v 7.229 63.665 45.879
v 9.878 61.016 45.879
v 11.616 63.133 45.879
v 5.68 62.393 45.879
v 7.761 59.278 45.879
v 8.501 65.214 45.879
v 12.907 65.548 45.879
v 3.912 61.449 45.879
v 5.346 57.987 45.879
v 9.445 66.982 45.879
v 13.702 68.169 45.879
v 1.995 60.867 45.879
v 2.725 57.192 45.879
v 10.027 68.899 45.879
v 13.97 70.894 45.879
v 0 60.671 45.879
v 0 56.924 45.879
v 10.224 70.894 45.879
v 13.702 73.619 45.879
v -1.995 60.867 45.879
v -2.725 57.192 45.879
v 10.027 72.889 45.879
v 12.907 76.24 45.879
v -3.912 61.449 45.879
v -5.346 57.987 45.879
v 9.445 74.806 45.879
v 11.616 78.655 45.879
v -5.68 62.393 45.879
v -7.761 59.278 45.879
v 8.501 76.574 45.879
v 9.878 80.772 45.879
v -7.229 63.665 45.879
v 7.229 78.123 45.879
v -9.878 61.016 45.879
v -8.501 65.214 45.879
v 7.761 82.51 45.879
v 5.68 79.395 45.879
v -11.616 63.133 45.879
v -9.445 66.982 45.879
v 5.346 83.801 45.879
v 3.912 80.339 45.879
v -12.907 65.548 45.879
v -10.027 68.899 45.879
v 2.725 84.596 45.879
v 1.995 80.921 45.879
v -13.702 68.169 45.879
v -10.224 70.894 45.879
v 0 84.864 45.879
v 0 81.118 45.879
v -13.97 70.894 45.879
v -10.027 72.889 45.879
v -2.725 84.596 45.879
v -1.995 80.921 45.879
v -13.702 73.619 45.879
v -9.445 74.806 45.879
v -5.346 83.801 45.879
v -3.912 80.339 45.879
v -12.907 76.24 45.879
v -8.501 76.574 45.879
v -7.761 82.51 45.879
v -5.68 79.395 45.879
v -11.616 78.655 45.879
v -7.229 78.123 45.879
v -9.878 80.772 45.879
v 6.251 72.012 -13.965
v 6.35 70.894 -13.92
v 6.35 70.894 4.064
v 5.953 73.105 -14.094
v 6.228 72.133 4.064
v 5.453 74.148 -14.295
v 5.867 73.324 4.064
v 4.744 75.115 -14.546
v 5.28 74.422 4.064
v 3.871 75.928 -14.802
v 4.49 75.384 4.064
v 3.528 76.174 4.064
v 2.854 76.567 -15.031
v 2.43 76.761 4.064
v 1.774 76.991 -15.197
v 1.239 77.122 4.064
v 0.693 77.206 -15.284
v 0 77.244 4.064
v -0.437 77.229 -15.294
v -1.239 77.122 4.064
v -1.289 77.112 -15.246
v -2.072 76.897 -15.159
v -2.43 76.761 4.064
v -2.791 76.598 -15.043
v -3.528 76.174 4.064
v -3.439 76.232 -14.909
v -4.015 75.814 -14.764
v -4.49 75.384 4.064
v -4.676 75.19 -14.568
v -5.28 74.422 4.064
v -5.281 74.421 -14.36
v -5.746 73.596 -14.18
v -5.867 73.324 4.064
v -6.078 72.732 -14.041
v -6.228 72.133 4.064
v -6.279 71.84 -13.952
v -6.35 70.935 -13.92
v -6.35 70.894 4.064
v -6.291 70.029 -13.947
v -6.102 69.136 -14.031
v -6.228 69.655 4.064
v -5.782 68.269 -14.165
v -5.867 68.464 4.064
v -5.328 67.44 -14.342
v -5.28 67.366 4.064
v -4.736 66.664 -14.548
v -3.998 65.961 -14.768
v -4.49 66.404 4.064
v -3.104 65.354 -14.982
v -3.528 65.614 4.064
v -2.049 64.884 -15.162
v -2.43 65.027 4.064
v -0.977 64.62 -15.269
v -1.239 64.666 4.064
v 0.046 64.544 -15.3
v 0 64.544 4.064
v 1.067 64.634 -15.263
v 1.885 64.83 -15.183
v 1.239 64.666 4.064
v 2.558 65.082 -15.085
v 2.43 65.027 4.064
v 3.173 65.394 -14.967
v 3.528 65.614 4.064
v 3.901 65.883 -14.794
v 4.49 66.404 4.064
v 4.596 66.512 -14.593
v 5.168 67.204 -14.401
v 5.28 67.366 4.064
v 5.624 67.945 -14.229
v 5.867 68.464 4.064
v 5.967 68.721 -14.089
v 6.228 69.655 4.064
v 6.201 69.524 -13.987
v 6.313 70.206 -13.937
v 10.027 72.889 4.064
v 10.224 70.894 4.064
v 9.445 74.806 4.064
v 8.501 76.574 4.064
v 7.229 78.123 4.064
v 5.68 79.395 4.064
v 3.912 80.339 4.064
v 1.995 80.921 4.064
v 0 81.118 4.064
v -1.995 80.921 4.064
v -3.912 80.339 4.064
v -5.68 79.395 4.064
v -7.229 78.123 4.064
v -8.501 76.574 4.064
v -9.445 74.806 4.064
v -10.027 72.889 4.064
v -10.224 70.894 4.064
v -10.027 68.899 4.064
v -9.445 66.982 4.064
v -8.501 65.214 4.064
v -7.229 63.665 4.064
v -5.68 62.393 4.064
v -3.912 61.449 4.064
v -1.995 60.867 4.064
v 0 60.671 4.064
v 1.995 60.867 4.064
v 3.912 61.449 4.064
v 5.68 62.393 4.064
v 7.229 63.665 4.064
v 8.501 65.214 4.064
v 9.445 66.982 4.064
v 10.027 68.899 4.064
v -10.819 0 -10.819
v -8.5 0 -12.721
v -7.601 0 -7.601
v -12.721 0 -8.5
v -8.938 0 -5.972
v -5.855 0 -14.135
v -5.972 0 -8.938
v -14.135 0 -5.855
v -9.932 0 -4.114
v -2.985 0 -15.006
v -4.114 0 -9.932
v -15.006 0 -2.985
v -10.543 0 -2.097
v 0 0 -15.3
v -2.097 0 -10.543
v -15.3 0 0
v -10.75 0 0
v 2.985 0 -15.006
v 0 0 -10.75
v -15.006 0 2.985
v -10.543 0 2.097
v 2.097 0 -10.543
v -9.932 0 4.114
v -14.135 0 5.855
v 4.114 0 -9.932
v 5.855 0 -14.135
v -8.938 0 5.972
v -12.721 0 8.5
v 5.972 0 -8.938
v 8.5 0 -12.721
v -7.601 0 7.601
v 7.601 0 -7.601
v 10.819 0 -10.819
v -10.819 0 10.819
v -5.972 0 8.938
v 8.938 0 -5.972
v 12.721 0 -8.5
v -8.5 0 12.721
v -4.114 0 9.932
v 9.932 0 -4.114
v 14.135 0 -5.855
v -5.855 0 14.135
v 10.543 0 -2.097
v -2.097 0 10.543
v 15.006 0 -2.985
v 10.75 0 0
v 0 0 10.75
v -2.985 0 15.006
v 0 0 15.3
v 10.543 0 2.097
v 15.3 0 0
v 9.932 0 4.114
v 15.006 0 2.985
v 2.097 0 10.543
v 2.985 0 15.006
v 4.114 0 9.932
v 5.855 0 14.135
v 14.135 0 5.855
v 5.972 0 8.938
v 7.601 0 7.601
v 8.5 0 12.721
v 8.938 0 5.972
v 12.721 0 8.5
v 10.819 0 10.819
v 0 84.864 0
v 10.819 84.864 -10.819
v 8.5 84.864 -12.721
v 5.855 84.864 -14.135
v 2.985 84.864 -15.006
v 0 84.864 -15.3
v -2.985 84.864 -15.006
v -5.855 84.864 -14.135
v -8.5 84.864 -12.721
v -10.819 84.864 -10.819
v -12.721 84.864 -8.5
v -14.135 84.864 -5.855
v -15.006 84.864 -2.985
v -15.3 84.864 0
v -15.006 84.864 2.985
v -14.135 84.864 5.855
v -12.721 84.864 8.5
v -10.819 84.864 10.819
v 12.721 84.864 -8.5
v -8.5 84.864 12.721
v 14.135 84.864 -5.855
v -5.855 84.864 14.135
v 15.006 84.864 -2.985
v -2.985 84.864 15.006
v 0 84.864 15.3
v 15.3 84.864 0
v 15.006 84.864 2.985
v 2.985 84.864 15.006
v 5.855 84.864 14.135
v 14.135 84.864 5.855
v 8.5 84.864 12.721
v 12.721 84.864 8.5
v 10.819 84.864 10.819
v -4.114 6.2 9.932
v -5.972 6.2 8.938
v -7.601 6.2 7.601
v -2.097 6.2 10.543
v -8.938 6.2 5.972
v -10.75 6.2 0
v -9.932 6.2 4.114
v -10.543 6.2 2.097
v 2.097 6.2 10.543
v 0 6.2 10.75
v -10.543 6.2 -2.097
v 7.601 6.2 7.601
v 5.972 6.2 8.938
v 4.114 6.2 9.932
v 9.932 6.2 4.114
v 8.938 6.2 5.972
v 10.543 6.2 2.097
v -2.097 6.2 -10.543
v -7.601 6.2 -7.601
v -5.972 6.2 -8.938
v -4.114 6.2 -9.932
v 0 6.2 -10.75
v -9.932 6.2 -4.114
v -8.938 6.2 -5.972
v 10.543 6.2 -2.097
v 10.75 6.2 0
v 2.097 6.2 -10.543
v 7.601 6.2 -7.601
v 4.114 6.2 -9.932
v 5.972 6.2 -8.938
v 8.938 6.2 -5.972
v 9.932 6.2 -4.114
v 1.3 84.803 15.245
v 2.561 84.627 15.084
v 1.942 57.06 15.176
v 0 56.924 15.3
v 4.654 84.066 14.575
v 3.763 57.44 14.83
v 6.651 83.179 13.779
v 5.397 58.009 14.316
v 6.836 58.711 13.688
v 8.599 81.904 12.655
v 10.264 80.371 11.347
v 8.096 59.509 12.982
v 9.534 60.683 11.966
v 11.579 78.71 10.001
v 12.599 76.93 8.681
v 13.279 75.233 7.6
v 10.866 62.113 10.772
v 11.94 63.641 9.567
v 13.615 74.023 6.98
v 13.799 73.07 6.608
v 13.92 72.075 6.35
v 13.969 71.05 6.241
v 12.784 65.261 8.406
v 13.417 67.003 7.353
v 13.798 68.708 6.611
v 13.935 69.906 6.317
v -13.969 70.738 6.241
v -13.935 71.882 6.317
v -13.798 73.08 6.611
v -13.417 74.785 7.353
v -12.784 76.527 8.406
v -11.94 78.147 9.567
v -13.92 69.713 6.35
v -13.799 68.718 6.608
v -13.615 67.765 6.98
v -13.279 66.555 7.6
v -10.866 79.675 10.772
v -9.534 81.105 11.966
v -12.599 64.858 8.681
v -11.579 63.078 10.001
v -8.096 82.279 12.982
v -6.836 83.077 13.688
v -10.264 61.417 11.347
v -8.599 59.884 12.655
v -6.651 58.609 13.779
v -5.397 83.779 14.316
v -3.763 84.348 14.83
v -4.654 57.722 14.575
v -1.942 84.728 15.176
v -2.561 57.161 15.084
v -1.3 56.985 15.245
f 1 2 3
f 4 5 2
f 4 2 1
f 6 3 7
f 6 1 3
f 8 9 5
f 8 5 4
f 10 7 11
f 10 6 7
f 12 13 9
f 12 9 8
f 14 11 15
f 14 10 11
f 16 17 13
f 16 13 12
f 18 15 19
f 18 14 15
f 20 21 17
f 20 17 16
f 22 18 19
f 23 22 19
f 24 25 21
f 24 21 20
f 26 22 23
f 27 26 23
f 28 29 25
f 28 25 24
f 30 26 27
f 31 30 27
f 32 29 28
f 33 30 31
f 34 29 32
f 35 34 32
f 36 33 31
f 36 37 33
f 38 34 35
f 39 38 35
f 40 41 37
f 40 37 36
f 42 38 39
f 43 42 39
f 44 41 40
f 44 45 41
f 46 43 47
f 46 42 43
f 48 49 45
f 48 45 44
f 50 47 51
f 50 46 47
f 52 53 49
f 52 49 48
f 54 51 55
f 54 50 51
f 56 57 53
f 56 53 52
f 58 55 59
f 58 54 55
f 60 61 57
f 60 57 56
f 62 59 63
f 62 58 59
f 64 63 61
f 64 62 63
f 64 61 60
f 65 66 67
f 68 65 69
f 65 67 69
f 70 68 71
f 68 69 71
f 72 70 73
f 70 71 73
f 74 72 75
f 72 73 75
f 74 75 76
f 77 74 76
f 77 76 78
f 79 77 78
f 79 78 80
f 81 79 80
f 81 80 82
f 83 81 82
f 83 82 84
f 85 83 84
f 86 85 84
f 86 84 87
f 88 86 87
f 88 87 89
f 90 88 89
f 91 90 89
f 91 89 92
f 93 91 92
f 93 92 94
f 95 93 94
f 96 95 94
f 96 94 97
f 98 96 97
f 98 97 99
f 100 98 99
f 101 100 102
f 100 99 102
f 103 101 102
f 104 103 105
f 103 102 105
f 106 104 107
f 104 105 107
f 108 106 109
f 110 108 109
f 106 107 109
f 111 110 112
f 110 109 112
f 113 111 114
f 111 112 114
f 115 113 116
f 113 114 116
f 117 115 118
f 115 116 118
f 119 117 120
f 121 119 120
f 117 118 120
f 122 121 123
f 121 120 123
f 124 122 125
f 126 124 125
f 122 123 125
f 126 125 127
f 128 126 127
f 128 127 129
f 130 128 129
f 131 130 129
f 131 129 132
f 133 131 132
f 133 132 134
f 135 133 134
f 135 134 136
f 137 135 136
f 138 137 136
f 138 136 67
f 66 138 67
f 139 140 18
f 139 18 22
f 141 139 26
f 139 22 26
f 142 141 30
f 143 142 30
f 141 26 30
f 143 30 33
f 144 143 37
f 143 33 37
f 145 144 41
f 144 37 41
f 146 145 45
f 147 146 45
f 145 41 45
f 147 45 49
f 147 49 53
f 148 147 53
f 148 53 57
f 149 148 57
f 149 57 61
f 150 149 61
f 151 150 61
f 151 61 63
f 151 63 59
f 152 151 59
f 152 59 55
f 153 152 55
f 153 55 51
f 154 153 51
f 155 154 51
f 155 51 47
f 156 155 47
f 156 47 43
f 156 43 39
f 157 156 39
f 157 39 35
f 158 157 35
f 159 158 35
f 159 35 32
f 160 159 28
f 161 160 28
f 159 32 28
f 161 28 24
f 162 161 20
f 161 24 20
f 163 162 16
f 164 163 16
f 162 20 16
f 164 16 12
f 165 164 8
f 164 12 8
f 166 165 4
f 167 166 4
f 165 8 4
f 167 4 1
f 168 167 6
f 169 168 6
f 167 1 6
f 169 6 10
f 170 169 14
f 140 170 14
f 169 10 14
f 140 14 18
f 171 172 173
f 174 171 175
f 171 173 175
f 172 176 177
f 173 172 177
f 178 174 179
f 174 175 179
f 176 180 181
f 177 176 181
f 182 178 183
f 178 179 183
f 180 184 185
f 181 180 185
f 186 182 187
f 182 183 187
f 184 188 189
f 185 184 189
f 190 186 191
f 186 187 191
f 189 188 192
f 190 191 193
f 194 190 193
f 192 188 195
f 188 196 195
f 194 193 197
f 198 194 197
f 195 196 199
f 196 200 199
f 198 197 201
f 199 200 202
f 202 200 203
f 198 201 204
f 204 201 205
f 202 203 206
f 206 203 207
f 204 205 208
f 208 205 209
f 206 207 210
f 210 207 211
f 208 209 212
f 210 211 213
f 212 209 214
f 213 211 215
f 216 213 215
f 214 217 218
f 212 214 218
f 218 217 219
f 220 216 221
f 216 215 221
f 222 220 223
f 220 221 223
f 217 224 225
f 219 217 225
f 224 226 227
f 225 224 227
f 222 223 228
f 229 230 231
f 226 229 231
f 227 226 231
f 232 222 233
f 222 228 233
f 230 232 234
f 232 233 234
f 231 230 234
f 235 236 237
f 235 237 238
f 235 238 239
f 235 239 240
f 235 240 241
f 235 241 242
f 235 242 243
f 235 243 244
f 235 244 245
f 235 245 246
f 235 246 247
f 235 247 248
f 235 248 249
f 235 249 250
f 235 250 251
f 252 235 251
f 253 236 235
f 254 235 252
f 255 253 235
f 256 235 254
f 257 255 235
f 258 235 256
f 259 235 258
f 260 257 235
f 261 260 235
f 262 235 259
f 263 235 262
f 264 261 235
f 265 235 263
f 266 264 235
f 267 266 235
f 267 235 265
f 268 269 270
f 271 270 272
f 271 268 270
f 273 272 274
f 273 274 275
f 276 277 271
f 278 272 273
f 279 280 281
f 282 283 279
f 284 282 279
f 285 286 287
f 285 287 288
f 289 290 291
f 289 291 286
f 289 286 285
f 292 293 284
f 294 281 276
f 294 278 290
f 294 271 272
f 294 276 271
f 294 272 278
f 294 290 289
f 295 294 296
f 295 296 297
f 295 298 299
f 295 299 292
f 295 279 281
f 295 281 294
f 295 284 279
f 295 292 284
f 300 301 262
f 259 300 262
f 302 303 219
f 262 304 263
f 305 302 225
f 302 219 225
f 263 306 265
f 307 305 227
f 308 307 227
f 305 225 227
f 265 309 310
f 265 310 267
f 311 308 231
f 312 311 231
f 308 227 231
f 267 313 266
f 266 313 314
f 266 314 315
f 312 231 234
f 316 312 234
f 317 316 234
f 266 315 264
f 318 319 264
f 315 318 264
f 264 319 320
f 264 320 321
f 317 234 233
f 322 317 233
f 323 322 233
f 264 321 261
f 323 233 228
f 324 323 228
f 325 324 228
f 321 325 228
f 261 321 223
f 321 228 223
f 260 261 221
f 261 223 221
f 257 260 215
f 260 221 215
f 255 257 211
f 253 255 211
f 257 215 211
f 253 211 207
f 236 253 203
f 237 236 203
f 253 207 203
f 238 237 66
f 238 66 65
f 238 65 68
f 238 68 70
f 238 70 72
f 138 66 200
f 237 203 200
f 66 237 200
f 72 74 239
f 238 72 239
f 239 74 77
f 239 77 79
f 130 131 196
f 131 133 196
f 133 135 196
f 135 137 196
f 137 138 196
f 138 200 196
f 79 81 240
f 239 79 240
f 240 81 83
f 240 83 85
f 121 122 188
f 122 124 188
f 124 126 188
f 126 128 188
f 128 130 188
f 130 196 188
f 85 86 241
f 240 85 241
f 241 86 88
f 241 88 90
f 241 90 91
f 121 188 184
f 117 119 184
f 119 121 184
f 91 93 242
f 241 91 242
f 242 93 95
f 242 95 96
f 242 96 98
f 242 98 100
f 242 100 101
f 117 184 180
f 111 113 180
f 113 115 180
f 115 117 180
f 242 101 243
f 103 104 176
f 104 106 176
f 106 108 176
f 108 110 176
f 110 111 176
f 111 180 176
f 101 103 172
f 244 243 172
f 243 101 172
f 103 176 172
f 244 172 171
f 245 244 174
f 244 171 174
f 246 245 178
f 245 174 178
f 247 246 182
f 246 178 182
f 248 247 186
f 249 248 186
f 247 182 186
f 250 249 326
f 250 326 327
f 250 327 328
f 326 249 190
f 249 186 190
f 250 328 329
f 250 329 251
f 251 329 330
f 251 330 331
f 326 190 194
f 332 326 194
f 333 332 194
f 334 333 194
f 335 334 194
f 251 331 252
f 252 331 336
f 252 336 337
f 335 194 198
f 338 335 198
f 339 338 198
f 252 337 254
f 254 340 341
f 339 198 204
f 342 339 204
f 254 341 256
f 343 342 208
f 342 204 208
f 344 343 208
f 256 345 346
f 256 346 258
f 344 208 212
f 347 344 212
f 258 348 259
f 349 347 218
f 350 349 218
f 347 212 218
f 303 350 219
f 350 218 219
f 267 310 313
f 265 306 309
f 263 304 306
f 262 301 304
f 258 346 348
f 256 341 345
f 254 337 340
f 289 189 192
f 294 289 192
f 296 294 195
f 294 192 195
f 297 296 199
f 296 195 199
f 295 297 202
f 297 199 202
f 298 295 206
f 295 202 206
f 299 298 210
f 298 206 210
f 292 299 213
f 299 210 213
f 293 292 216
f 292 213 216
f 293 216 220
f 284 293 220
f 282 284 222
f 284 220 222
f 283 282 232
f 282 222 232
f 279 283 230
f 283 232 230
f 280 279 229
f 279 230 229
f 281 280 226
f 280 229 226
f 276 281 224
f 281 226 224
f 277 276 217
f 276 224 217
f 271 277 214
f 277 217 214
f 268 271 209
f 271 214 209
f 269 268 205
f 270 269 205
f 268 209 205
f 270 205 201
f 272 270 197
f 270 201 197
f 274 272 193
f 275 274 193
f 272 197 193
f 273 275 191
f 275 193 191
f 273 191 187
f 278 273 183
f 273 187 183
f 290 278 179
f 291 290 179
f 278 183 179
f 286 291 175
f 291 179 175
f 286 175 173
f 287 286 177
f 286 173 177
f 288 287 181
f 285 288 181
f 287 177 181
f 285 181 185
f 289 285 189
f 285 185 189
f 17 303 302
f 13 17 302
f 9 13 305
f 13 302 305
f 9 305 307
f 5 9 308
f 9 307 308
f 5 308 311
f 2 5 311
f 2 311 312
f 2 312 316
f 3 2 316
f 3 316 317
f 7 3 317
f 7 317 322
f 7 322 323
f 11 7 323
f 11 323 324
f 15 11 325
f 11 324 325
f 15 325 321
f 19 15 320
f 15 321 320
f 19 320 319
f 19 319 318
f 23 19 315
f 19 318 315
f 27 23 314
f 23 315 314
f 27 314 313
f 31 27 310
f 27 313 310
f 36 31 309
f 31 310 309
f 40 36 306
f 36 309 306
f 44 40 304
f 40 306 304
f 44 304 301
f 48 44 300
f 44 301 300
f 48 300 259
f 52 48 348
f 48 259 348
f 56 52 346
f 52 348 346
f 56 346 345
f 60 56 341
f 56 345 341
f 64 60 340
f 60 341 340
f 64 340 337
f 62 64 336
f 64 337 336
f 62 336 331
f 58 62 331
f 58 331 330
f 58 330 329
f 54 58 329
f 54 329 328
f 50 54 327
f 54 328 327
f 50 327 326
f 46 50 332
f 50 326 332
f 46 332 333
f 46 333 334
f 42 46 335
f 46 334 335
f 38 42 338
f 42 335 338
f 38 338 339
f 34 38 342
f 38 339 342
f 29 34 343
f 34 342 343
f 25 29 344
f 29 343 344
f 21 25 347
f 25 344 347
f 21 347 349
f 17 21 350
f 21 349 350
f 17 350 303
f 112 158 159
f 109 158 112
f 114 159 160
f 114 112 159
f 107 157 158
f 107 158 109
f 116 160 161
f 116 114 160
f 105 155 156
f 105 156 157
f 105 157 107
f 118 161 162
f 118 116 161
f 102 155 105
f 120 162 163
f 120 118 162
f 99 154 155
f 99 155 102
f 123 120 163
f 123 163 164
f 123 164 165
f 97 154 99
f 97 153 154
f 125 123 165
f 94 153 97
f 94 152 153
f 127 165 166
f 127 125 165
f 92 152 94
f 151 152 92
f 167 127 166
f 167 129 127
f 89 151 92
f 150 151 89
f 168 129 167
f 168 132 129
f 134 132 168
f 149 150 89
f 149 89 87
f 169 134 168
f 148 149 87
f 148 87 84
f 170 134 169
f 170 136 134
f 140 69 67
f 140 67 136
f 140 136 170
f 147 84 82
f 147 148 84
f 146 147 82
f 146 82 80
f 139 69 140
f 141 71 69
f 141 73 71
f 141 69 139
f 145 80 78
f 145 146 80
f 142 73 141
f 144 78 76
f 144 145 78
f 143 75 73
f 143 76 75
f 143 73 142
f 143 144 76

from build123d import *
from build123d.topology import SkipClean

# Parameters (mm, degrees)
SKETCH1_R           = 15.3
BOSS_EXTRUDE1_DEPTH = 84.864
SKETCH2_R           = 13.97
BOSS_EXTRUDE2_DEPTH = 57.15
BOSS_EXTRUDE3_DEPTH = 2.54
SKETCH4_R           = 10.2235
CUT_EXTRUDE1_DEPTH  = 5.08
SKETCH5_R           = 14.2621
SKETCH5_R_2         = 10.2235
BOSS_EXTRUDE4_DEPTH = 19.05
SKETCH6_R           = 10.75
CUT_EXTRUDE2_DEPTH  = 6.2
SKETCH8_R           = 14.2621
CUT_EXTRUDE5_DEPTH  = 10.16
SKETCH10_R          = 13.97
BOSS_EXTRUDE5_DEPTH = 24.13
SKETCH11_R          = 10.2235
CUT_EXTRUDE7_DEPTH  = 41.91
SKETCH13_R          = 14.2621
SKETCH13_R_2        = 10.2235
CUT_EXTRUDE9_DEPTH  = 41.91
SKETCH16_R          = 13.97
SKETCH16_R_2        = 10.2235
CUT_EXTRUDE10_DEPTH = 27.78125
SKETCH17_R          = 10.2235
CUT_EXTRUDE11_DEPTH = 27.686
SKETCH18_R          = 6.35
CUT_EXTRUDE12_DEPTH = 111.506


with BuildPart() as part:
    # Sketch1 → Boss-Extrude1 (new body)
    with BuildSketch(Plane(origin=(0, 0, 0), x_dir=(1, 0, 0), z_dir=(0, 1, 0))):
        with Locations(Location((0, 0, 0), (0, 0, 270))):
            Circle(SKETCH1_R)
    extrude(amount=BOSS_EXTRUDE1_DEPTH)

    # Sketch2 → Boss-Extrude2 (add)
    with BuildSketch(Plane.XY):
        with Locations(Location((0, 70.894, 0), (0, 0, 269.999999993))):
            Circle(SKETCH2_R)
    extrude(amount=BOSS_EXTRUDE2_DEPTH)

    # Sketch3 → Boss-Extrude3 (add, symmetric)
    with BuildSketch(Plane.XY.offset(57.15)):
        with BuildLine():
            Line((16.764, 70.894), (16.764, 40.838899717))
            ThreePointArc((16.764, 40.838899717), (0, 24.074899717), (-16.764, 40.838899717))
            Line((-16.764, 40.838899717), (-16.764, 70.894))
            ThreePointArc((-16.764, 70.894), (0, 87.658), (16.764, 70.894))
        make_face()
    extrude(amount=BOSS_EXTRUDE3_DEPTH, both=True)

    # Sketch4 → Cut-Extrude1 (cut)
    with BuildSketch(Plane.XY.offset(59.69)):
        with Locations((0, 40.838899717)):
            Circle(SKETCH4_R)
    extrude(amount=-CUT_EXTRUDE1_DEPTH, mode=Mode.SUBTRACT)

    # Sketch5 → Boss-Extrude4 (add, symmetric)
    with SkipClean():  # the faces are left unmerged after this step: merging them gives an invalid solid
        with BuildSketch(Plane(origin=(0, 0, 54.61), x_dir=(-1, 0, 0), z_dir=(0, 0, -1))):
            with Locations(Location((0, 40.838899717, 0), (0, 0, 180))):
                Circle(SKETCH5_R)
            with Locations((0, 40.838899717)):
                Circle(SKETCH5_R_2, mode=Mode.SUBTRACT)
        extrude(amount=BOSS_EXTRUDE4_DEPTH, both=True)

    # Sketch6 → Cut-Extrude2 (cut)
    with SkipClean():  # the faces are left unmerged after this step: merging them gives an invalid solid
        with BuildSketch(Plane.XZ):
            with Locations(Location((0, 0, 0), (0, 0, 270))):
                Circle(SKETCH6_R)
        extrude(amount=-CUT_EXTRUDE2_DEPTH, mode=Mode.SUBTRACT)

    # Sketch8 → Cut-Extrude5 (cut)
    with SkipClean():  # the faces are left unmerged after this step: merging them gives an invalid solid
        with BuildSketch(Plane.XY.offset(59.69)):
            with BuildLine():
                Line((-16.764, 70.894), (-16.764, 40.838899717))
                ThreePointArc((-16.764, 40.838899717), (0, 24.074899717), (16.764, 40.838899717))
                Line((16.764, 40.838899717), (16.764, 70.894))
                ThreePointArc((16.764, 70.894), (0, 87.658), (-16.764, 70.894))
            make_face()
            with Locations((0, 40.838899717)):
                Circle(SKETCH8_R, mode=Mode.SUBTRACT)
        extrude(amount=-CUT_EXTRUDE5_DEPTH, mode=Mode.SUBTRACT)


with BuildPart() as cut_extrude5_piece_1:
    # of the separate pieces the step leaves, piece 1, a body of its own (cut_extrude5_pieces)
    add(part.part.solids().sort_by_distance((0, 0, 15.3))[0])

    # Sketch10 → Boss-Extrude5 (add)
    with BuildSketch(Plane.XY.offset(49.53)):
        with Locations(Location((0, 70.894, 0), (0, 0, 90))):
            Circle(SKETCH10_R)
    extrude(amount=BOSS_EXTRUDE5_DEPTH)

    # Sketch11 → Cut-Extrude7 (cut)
    with BuildSketch(Plane.XY.offset(73.66)):
        with Locations((0, 70.894)):
            Circle(SKETCH11_R)
    extrude(amount=-CUT_EXTRUDE7_DEPTH, mode=Mode.SUBTRACT)

    # Sketch16 → Cut-Extrude10 (cut)
    with BuildSketch(Plane.XY.offset(73.66)):
        with Locations(Location((0, 70.894, 0), (0, 0, 90))):
            Circle(SKETCH16_R)
        with Locations((0, 70.894)):
            Circle(SKETCH16_R_2, mode=Mode.SUBTRACT)
    extrude(amount=-CUT_EXTRUDE10_DEPTH, mode=Mode.SUBTRACT)

    # Sketch17 → Cut-Extrude11 (cut)
    with BuildSketch(Plane.XY.offset(31.75)):
        with Locations((0, 70.894)):
            Circle(SKETCH17_R)
    extrude(amount=-CUT_EXTRUDE11_DEPTH, mode=Mode.SUBTRACT)

    # Sketch18 → Cut-Extrude12 (cut)
    with BuildSketch(Plane.XY.offset(4.064)):
        with Locations((0, 70.894)):
            Circle(SKETCH18_R)
    extrude(amount=-CUT_EXTRUDE12_DEPTH, mode=Mode.SUBTRACT)


with BuildPart() as cut_extrude5_piece_2:
    # of the separate pieces the step leaves, piece 2, a body of its own (cut_extrude5_pieces)
    add(part.part.solids().sort_by_distance((14.2621, 40.838899717, 54.61))[0])

    # Sketch13 → Cut-Extrude9 (cut)
    with BuildSketch(Plane.XY.offset(73.66)):
        with Locations((0, 40.838899717)):
            Circle(SKETCH13_R)
        with Locations((0, 40.838899717)):
            Circle(SKETCH13_R_2, mode=Mode.SUBTRACT)
    extrude(amount=-CUT_EXTRUDE9_DEPTH, mode=Mode.SUBTRACT)


solid = cut_extrude5_piece_1.part
